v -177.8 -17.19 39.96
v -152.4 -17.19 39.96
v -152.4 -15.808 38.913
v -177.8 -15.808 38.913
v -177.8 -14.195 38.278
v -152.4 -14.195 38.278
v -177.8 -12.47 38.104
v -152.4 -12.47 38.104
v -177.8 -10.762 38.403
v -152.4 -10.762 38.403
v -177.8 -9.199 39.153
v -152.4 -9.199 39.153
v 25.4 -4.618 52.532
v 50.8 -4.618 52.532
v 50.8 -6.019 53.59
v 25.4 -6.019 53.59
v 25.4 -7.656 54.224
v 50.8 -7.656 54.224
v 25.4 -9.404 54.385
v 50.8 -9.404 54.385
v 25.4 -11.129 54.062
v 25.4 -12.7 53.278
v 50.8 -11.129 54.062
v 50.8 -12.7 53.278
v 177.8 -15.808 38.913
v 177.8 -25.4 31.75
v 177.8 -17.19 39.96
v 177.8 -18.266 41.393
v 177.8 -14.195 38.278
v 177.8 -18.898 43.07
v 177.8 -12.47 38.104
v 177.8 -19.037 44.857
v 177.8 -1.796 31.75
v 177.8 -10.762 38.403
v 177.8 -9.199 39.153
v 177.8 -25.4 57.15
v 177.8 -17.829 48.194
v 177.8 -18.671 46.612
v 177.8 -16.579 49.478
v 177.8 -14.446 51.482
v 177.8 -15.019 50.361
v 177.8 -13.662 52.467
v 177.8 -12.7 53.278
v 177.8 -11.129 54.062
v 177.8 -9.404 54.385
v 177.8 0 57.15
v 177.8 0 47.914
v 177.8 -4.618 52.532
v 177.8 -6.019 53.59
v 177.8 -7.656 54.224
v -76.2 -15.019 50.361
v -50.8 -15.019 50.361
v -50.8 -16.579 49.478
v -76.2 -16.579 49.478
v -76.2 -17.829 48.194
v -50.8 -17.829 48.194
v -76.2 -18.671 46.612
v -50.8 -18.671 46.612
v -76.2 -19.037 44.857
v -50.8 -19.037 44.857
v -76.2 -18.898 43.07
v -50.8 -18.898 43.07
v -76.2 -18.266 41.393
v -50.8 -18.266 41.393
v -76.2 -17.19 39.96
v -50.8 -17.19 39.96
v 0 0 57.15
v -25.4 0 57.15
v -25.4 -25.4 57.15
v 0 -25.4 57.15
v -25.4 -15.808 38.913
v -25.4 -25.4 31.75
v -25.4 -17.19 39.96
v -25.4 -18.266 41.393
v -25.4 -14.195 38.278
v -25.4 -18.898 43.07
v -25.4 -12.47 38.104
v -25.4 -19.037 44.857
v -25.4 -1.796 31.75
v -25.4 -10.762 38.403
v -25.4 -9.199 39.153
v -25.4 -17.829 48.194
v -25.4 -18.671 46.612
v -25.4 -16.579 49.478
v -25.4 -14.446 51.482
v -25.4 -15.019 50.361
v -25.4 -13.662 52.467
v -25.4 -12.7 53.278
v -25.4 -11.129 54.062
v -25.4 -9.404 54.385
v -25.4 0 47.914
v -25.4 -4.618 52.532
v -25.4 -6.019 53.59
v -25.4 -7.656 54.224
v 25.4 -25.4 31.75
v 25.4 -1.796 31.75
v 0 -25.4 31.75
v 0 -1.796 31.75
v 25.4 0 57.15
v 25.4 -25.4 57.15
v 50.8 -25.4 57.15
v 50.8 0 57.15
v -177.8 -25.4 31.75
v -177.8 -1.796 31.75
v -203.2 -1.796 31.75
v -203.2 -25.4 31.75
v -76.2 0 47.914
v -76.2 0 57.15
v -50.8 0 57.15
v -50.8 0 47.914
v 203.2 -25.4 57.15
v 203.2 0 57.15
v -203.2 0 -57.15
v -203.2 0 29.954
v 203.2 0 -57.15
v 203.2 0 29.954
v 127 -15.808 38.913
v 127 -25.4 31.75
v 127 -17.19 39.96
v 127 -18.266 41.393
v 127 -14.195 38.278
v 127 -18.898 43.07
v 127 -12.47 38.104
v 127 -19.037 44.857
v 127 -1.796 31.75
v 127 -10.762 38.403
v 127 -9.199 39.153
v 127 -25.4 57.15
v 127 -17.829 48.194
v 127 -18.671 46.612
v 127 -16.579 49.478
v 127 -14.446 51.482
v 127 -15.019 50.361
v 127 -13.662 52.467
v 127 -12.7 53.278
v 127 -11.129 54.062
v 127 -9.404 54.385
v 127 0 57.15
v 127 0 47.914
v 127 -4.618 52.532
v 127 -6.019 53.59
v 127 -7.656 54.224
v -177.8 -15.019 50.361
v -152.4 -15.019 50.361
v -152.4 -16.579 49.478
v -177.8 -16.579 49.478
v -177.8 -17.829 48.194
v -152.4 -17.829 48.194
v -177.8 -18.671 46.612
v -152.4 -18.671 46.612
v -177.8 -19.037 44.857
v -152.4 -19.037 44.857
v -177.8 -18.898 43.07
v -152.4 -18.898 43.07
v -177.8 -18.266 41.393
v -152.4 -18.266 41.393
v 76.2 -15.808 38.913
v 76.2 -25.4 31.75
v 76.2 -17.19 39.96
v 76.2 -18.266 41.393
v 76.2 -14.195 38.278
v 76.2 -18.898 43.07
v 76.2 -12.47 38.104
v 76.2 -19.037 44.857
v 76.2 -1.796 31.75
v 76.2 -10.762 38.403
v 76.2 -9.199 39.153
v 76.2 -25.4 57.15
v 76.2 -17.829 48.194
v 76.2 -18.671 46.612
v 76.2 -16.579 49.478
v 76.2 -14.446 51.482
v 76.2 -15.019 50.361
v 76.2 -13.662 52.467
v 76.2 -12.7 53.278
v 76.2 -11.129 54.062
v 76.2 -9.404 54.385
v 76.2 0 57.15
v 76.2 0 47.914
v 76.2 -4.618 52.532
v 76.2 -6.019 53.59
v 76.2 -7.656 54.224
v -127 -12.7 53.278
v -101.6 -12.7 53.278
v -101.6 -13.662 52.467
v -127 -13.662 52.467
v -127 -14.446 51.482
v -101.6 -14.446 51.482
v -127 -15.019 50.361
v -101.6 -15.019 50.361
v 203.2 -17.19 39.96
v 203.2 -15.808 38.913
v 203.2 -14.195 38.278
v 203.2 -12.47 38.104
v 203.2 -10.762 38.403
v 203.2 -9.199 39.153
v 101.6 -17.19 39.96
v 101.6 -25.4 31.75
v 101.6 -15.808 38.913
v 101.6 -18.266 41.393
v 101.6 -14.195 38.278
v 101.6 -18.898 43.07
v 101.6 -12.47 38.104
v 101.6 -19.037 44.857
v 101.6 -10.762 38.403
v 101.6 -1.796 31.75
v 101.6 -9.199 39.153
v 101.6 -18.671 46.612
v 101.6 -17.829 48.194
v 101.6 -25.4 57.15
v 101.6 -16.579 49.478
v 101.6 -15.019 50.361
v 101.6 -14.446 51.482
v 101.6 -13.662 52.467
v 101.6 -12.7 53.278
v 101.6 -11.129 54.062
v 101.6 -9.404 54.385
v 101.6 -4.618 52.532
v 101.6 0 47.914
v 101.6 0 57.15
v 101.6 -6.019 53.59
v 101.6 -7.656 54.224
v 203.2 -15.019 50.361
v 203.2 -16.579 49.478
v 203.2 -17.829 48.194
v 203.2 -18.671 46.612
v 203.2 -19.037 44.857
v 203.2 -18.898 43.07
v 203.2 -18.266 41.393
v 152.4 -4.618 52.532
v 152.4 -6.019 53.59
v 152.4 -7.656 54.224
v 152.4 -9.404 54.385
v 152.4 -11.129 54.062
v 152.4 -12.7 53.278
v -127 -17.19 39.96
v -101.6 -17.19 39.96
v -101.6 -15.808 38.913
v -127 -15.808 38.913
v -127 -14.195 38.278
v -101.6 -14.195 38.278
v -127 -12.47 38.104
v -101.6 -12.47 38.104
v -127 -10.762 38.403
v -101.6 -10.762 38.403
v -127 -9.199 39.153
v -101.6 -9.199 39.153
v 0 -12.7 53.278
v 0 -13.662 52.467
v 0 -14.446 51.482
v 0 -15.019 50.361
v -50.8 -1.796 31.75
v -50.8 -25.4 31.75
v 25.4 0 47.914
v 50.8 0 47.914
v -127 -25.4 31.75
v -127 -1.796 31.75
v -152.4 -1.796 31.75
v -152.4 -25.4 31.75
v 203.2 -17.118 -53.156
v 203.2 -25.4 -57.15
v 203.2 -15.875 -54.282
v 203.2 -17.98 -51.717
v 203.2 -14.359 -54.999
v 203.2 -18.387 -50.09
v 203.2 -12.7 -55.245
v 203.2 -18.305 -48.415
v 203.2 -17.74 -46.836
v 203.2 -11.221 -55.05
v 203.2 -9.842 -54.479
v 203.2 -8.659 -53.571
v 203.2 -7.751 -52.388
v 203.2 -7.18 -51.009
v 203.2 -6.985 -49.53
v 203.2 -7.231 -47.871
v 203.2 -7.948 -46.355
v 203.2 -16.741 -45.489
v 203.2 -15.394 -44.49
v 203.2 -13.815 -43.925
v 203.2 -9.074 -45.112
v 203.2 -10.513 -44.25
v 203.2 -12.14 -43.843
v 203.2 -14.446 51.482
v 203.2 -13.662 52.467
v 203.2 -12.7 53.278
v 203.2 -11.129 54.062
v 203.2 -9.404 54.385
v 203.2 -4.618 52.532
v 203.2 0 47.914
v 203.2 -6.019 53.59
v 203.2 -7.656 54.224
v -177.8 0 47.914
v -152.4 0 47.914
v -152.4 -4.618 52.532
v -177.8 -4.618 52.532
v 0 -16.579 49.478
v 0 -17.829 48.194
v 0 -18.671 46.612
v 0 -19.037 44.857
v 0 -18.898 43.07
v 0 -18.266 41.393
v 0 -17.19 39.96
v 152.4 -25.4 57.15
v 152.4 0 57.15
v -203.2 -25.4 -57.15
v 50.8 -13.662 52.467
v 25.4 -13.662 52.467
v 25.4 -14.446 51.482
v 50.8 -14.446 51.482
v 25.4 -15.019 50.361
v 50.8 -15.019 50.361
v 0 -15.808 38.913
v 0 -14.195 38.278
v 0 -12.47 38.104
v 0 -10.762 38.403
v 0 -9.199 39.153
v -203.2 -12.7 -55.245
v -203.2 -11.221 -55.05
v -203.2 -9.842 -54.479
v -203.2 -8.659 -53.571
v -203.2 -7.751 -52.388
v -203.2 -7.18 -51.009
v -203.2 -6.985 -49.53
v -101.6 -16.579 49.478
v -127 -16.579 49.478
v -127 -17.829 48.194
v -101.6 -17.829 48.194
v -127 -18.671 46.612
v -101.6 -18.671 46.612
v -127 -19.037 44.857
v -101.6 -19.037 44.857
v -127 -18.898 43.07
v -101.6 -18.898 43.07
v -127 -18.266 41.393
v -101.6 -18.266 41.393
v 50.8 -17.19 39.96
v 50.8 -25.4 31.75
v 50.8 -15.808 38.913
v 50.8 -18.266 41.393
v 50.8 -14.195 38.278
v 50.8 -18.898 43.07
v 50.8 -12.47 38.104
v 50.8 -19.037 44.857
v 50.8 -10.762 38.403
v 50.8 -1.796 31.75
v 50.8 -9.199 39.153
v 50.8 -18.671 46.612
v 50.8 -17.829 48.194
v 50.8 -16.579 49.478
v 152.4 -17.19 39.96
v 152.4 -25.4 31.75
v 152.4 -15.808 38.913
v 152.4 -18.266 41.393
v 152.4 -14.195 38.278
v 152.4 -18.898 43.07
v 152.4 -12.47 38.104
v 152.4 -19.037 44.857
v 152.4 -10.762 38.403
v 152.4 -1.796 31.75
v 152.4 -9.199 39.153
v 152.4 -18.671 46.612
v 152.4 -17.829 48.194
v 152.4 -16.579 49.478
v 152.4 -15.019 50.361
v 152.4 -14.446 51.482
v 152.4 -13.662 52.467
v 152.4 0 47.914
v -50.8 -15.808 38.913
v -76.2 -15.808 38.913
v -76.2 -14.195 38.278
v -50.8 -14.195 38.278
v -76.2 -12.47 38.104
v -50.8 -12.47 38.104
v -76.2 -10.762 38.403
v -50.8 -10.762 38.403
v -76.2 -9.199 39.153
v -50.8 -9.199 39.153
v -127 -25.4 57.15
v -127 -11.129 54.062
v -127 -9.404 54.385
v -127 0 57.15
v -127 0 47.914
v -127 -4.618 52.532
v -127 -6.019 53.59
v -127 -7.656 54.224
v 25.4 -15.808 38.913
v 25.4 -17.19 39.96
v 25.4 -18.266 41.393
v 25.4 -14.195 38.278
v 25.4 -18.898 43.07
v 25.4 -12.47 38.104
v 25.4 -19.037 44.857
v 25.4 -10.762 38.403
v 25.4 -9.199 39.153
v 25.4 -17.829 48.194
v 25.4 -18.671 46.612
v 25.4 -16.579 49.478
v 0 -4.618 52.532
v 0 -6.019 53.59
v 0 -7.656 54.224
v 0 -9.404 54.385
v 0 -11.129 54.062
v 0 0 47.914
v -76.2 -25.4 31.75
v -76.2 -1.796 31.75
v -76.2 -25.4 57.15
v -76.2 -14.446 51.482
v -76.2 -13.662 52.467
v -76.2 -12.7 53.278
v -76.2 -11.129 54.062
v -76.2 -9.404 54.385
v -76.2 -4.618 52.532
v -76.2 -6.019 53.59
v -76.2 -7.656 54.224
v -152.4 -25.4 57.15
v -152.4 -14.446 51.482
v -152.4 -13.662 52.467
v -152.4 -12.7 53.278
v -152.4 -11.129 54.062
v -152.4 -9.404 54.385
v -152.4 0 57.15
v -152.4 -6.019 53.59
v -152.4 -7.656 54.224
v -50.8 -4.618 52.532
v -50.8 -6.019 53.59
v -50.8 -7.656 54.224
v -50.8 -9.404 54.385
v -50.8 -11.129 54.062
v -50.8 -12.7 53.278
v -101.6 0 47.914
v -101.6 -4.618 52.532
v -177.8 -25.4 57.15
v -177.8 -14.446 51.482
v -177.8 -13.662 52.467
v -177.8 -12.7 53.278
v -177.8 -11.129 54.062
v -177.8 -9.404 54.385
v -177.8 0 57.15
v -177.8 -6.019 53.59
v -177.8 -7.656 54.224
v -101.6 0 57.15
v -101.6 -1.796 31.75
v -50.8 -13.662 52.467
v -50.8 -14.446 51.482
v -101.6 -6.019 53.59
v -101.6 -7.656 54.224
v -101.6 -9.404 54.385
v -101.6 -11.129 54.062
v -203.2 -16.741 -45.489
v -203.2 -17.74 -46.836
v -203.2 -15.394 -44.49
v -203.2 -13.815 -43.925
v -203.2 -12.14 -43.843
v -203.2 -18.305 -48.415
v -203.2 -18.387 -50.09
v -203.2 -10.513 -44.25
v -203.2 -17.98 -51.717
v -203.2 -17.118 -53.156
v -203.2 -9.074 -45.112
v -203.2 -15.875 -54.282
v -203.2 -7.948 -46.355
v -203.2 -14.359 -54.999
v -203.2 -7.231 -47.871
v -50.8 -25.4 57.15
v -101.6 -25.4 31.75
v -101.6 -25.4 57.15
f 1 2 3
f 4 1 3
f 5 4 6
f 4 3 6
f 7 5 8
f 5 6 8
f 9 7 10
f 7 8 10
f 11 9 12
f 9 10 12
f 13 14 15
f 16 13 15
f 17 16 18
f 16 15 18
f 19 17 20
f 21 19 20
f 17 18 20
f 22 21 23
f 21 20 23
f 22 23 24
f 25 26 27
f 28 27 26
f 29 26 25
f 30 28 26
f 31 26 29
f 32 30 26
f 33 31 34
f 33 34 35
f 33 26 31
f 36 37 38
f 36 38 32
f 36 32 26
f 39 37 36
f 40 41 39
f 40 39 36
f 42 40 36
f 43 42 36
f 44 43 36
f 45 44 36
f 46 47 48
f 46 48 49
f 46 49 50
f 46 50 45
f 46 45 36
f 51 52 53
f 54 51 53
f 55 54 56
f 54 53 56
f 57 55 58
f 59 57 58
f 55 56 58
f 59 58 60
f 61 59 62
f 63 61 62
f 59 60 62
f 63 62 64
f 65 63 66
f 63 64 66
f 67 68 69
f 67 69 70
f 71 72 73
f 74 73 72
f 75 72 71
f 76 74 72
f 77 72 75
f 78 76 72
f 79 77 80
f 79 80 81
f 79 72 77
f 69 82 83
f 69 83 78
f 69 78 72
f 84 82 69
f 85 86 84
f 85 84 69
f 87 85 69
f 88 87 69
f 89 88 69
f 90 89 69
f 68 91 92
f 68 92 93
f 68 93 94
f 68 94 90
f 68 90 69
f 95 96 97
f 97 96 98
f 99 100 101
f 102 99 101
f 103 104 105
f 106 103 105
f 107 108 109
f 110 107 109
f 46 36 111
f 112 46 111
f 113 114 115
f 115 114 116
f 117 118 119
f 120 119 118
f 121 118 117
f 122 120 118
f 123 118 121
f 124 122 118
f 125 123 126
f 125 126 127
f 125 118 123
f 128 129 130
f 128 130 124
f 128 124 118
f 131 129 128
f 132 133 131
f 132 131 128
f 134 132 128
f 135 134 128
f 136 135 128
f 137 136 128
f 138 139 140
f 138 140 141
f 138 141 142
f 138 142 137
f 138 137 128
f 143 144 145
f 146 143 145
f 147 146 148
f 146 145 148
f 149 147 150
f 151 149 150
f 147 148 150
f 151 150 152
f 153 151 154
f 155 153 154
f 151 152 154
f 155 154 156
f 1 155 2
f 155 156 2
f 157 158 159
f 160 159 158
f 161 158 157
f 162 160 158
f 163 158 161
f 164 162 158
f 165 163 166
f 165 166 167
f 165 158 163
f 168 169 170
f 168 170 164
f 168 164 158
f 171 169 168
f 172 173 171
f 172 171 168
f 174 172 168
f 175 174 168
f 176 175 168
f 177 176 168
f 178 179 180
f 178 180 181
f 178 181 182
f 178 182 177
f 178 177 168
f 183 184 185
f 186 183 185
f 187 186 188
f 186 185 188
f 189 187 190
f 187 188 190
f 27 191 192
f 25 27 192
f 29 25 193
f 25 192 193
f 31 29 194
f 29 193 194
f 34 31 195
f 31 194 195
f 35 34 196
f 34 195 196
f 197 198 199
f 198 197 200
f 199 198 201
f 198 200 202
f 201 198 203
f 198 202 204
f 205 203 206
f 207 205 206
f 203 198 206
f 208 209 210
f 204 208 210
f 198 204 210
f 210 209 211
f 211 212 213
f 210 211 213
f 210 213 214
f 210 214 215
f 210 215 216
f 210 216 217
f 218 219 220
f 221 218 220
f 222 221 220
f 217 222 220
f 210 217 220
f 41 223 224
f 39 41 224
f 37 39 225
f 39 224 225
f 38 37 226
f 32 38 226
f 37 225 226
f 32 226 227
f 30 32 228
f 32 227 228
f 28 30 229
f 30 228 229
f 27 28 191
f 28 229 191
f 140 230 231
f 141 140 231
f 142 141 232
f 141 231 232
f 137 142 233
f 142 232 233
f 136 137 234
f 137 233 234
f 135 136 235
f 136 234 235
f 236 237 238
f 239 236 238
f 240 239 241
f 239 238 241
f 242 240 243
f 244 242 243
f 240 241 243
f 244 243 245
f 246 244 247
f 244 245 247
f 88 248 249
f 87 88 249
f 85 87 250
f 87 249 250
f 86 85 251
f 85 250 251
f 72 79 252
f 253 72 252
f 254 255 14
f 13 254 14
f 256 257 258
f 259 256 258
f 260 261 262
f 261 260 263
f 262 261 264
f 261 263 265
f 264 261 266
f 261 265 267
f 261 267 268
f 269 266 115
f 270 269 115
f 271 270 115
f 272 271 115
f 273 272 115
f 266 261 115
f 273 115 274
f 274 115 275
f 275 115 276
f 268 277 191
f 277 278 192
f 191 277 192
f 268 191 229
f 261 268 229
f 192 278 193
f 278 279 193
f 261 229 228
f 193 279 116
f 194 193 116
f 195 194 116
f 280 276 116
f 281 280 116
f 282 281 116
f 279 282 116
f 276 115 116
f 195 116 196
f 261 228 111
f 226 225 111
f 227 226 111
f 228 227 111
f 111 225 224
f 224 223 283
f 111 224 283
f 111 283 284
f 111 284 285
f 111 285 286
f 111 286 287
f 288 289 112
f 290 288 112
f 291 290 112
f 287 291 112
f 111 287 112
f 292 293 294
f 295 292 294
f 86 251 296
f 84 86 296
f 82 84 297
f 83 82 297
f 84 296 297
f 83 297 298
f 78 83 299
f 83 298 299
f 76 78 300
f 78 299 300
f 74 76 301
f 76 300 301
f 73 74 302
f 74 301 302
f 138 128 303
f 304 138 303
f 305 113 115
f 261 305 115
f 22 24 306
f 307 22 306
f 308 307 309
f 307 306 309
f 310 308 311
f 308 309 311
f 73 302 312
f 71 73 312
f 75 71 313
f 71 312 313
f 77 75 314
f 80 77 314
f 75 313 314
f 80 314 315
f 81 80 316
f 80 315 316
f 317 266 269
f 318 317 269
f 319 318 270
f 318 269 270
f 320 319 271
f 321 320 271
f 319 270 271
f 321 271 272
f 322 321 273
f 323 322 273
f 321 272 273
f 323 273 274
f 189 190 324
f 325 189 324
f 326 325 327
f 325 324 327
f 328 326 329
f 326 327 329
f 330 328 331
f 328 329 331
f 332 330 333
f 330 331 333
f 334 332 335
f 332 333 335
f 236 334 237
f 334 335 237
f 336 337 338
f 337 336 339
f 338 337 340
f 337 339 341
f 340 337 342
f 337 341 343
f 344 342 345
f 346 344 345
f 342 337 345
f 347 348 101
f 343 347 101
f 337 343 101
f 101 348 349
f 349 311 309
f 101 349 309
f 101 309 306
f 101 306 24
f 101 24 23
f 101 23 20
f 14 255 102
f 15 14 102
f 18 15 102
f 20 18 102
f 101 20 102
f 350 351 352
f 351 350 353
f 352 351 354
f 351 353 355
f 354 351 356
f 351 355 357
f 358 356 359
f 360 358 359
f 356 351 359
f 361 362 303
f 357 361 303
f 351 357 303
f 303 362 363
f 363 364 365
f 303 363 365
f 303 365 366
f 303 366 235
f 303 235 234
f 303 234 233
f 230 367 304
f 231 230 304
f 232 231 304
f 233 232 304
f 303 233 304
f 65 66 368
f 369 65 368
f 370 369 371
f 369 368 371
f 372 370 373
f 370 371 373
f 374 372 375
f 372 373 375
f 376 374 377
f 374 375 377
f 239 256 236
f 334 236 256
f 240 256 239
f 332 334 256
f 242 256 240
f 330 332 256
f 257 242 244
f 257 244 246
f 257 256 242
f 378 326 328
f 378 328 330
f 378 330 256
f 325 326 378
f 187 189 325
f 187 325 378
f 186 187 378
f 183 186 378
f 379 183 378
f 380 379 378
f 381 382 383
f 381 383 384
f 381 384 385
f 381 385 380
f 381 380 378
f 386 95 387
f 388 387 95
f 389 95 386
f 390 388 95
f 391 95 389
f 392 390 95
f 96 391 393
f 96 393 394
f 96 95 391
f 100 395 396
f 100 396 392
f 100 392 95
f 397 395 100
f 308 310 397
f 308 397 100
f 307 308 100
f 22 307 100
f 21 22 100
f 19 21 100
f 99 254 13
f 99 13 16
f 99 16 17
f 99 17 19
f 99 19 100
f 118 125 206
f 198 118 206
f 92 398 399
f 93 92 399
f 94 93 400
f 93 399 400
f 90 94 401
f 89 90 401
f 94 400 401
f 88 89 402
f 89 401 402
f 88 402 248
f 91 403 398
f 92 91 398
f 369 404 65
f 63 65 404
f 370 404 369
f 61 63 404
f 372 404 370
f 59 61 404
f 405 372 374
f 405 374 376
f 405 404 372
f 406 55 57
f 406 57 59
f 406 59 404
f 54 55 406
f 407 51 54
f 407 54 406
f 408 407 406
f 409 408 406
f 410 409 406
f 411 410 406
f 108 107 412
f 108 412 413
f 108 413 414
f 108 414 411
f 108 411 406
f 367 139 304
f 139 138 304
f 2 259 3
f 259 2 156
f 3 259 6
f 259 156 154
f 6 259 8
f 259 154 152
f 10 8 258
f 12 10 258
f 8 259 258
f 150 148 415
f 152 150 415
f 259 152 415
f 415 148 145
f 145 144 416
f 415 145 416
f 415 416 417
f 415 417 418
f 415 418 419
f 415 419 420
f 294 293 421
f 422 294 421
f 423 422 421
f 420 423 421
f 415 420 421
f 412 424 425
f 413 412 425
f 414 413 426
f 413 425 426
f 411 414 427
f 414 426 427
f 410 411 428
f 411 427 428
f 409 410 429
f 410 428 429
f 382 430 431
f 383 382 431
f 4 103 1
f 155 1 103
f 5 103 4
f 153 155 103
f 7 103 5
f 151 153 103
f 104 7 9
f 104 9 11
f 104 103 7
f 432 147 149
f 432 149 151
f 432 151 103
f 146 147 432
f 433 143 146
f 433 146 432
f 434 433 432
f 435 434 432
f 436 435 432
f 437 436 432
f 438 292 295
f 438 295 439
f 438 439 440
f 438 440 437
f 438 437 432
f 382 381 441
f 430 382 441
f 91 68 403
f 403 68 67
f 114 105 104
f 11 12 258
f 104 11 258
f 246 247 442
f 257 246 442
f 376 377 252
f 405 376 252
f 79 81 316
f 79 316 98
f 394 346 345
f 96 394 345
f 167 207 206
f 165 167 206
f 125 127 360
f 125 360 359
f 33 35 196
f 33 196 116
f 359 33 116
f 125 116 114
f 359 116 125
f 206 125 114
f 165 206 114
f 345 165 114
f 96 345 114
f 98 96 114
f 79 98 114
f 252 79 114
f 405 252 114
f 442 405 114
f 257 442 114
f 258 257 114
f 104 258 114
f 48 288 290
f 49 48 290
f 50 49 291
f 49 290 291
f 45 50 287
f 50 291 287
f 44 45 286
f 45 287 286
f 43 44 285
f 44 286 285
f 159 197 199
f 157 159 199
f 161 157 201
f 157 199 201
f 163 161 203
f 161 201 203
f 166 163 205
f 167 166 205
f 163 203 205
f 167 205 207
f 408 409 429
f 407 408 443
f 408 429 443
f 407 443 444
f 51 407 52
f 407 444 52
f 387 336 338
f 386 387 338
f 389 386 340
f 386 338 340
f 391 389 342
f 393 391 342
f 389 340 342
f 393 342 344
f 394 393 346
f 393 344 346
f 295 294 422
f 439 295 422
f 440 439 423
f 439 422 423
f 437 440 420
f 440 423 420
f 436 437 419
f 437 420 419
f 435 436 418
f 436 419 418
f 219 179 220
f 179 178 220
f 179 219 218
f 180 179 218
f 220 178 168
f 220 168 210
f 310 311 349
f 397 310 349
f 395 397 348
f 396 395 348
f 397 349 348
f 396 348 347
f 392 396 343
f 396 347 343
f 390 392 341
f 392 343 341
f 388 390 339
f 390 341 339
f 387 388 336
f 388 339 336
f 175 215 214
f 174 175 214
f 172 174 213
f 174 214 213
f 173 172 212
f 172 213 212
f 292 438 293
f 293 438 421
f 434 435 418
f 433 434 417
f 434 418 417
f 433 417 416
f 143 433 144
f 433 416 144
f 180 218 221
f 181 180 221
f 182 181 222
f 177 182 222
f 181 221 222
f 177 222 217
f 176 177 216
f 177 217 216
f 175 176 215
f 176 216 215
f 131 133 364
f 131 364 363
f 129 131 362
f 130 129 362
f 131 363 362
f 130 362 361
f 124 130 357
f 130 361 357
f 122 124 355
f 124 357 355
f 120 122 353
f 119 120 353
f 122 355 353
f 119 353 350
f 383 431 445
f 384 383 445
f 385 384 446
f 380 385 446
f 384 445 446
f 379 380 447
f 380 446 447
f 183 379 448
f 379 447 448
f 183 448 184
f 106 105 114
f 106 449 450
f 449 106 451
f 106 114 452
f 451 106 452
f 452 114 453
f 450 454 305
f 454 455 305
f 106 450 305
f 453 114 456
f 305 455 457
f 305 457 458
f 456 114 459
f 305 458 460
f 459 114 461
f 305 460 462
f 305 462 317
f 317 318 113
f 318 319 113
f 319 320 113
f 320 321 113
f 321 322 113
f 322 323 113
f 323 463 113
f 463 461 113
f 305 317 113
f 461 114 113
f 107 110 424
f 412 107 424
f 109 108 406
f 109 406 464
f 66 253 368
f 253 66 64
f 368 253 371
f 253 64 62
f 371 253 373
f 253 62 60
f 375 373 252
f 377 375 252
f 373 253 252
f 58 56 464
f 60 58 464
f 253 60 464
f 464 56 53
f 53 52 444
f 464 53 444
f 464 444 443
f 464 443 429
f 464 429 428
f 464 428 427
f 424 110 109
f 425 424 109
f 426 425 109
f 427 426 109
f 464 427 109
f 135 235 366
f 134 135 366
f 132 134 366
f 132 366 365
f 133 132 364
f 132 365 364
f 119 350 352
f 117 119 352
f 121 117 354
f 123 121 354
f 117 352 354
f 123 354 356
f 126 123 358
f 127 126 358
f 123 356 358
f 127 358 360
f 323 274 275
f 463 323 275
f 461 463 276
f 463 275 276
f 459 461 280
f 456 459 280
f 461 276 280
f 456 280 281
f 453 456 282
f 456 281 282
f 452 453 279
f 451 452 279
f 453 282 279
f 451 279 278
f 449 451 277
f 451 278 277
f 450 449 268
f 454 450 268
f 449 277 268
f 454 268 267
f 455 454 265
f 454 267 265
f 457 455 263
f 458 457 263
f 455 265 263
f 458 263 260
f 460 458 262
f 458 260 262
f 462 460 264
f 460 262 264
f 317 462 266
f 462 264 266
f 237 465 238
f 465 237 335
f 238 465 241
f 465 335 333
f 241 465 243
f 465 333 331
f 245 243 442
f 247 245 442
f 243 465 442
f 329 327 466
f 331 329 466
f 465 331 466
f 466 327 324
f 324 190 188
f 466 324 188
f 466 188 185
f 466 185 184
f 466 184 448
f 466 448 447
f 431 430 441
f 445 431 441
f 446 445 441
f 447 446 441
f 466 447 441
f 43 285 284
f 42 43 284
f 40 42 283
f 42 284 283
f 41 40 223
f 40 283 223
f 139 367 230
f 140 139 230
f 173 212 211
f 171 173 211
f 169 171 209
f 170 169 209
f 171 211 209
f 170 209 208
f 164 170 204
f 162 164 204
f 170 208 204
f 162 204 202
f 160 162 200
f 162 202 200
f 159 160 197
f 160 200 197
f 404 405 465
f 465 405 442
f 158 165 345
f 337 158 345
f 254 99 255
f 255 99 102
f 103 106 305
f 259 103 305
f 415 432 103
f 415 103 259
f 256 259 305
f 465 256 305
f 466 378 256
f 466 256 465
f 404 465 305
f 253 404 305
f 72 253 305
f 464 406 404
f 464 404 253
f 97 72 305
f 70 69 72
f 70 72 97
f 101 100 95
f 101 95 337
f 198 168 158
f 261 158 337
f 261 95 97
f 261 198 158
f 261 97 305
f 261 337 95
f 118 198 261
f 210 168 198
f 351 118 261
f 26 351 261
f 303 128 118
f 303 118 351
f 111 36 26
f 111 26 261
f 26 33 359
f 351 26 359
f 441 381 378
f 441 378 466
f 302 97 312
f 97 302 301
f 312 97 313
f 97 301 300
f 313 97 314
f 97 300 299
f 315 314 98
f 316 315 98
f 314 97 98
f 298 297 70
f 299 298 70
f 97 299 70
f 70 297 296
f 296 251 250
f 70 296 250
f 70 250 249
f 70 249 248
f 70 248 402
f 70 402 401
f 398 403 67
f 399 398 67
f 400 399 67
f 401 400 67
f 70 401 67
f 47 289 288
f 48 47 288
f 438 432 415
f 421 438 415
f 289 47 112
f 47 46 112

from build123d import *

# Parameters (mm, degrees)
F0_W     = 25.4
F0_H     = 25.4
F1_DEPTH = 25.4
F3_DEPTH = 412.75
F5_DEPTH = 598.932


with BuildPart() as f1:
    # F0 (on Front) → F1 (new body)
    with BuildSketch(Plane.XZ):
        Polygon((-203.2, -57.15), (203.2, -57.15), (203.2, 31.75), (177.8, 31.75), (152.4, 31.75), (127, 31.75), (101.6, 31.75), (76.2, 31.75), (50.8, 31.75), (25.4, 31.75), (0, 31.75), (-25.4, 31.75), (-50.8, 31.75), (-76.2, 31.75), (-101.6, 31.75), (-127, 31.75), (-152.4, 31.75), (-177.8, 31.75), (-203.2, 31.75), align=None)
        with Locations((190.5, 44.45)):
            Rectangle(F0_W, F0_H)
        with Locations((139.7, 44.45)):
            Rectangle(F0_W, F0_H)
        with Locations((88.9, 44.45)):
            Rectangle(F0_W, F0_H)
        with Locations((38.1, 44.45)):
            Rectangle(F0_W, F0_H)
        with Locations((-12.7, 44.45)):
            Rectangle(F0_W, F0_H)
        with Locations((-63.5, 44.45)):
            Rectangle(F0_W, F0_H)
        with Locations((-114.3, 44.45)):
            Rectangle(F0_W, F0_H)
        with Locations((-165.1, 44.45)):
            Rectangle(F0_W, F0_H)
    extrude(amount=F1_DEPTH)

    # F2 (on face) → F3 (cut)
    with BuildSketch(Plane.YZ.offset(203.2)):
        with BuildLine():
            ThreePointArc((-4.617769491, 52.532230509), (-8.5240978333, 54.3652091128), (-12.7, 53.278446593))
            Line((-12.7, 53.278446593), (-12.7, 50.8))
            ThreePointArc((-12.7, 50.8), (-10.2699602045, 50.3166350314), (-8.2098719395, 48.9401280605))
            Line((-8.2098719395, 48.9401280605), (-4.617769491, 52.532230509))
        make_face()
        with BuildLine():
            Line((-12.7, 50.8), (-12.7, 53.278446593))
            ThreePointArc((-12.7, 53.278446593), (-14.0784278664, 51.9938524898), (-15.0192191193, 50.3613215677))
            ThreePointArc((-15.0192191193, 50.3613215677), (-13.8801711836, 50.6893666327), (-12.7, 50.8))
        make_face()
        with BuildLine():
            ThreePointArc((-8.2098719395, 48.9401280605), (-10.2699602045, 50.3166350314), (-12.7, 50.8))
            Line((-12.7, 50.8), (-12.7, 44.45))
            Line((-12.7, 44.45), (-8.2098719395, 48.9401280605))
        make_face()
        with BuildLine():
            Line((-12.7, 44.45), (-12.7, 50.8))
            ThreePointArc((-12.7, 50.8), (-13.8801711836, 50.6893666327), (-15.0192191193, 50.3613215677))
            ThreePointArc((-15.0192191193, 50.3613215677), (-15.3239526387, 46.744736211), (-13.5980256121, 43.5519743879))
            Line((-13.5980256121, 43.5519743879), (-12.7, 44.45))
        make_face()
        with BuildLine():
            ThreePointArc((-13.5980256121, 43.5519743879), (-15.3239526387, 46.744736211), (-15.0192191193, 50.3613215677))
            ThreePointArc((-15.0192191193, 50.3613215677), (-18.9160550871, 45.7473662374), (-17.1901280605, 39.9598719395))
            Line((-17.1901280605, 39.9598719395), (-13.5980256121, 43.5519743879))
        make_face()
        with BuildLine():
            Line((-8.2098719395, 48.9401280605), (-12.7, 44.45))
            Line((-12.7, 44.45), (-13.5980256121, 43.5519743879))
            Line((-13.5980256121, 43.5519743879), (-9.1986165609, 39.1525653367))
            ThreePointArc((-9.1986165609, 39.1525653367), (-7.1073134882, 41.4426161567), (-6.35, 44.45))
            ThreePointArc((-6.35, 44.45), (-6.8333649686, 46.8800397955), (-8.2098719395, 48.9401280605))
        make_face()
        with BuildLine():
            Line((-13.5980256121, 43.5519743879), (-17.1901280605, 39.9598719395))
            ThreePointArc((-17.1901280605, 39.9598719395), (-13.3382319087, 38.1321554284), (-9.1986165609, 39.1525653367))
            Line((-9.1986165609, 39.1525653367), (-13.5980256121, 43.5519743879))
        make_face()
        with BuildLine():
            Line((0, 40.7302561211), (-8.2098719395, 48.9401280605))
            ThreePointArc((-8.2098719395, 48.9401280605), (-6.8333649686, 46.8800397955), (-6.35, 44.45))
            ThreePointArc((-6.35, 44.45), (-7.1073134882, 41.4426161567), (-9.1986165609, 39.1525653367))
            Line((-9.1986165609, 39.1525653367), (0, 29.9539487758))
            Line((0, 29.9539487758), (0, 40.7302561211))
        make_face()
        Polygon((0, 47.9144610179), (-4.617769491, 52.532230509), (-8.2098719395, 48.9401280605), (0, 40.7302561211), align=None)
    extrude(amount=-F3_DEPTH, mode=Mode.SUBTRACT)

    # F4 (on face) → F5 (cut)
    with BuildSketch(Plane.YZ.offset(203.2)):
        with BuildLine():
            ThreePointArc((-12.7, -55.245), (-8.6588847455, -53.5711152545), (-6.985, -49.53))
            ThreePointArc((-6.985, -49.53), (-16.7411152545, -45.4888847455), (-12.7, -55.245))
        make_face()
    extrude(amount=-F5_DEPTH, mode=Mode.SUBTRACT)


solid = f1.part
